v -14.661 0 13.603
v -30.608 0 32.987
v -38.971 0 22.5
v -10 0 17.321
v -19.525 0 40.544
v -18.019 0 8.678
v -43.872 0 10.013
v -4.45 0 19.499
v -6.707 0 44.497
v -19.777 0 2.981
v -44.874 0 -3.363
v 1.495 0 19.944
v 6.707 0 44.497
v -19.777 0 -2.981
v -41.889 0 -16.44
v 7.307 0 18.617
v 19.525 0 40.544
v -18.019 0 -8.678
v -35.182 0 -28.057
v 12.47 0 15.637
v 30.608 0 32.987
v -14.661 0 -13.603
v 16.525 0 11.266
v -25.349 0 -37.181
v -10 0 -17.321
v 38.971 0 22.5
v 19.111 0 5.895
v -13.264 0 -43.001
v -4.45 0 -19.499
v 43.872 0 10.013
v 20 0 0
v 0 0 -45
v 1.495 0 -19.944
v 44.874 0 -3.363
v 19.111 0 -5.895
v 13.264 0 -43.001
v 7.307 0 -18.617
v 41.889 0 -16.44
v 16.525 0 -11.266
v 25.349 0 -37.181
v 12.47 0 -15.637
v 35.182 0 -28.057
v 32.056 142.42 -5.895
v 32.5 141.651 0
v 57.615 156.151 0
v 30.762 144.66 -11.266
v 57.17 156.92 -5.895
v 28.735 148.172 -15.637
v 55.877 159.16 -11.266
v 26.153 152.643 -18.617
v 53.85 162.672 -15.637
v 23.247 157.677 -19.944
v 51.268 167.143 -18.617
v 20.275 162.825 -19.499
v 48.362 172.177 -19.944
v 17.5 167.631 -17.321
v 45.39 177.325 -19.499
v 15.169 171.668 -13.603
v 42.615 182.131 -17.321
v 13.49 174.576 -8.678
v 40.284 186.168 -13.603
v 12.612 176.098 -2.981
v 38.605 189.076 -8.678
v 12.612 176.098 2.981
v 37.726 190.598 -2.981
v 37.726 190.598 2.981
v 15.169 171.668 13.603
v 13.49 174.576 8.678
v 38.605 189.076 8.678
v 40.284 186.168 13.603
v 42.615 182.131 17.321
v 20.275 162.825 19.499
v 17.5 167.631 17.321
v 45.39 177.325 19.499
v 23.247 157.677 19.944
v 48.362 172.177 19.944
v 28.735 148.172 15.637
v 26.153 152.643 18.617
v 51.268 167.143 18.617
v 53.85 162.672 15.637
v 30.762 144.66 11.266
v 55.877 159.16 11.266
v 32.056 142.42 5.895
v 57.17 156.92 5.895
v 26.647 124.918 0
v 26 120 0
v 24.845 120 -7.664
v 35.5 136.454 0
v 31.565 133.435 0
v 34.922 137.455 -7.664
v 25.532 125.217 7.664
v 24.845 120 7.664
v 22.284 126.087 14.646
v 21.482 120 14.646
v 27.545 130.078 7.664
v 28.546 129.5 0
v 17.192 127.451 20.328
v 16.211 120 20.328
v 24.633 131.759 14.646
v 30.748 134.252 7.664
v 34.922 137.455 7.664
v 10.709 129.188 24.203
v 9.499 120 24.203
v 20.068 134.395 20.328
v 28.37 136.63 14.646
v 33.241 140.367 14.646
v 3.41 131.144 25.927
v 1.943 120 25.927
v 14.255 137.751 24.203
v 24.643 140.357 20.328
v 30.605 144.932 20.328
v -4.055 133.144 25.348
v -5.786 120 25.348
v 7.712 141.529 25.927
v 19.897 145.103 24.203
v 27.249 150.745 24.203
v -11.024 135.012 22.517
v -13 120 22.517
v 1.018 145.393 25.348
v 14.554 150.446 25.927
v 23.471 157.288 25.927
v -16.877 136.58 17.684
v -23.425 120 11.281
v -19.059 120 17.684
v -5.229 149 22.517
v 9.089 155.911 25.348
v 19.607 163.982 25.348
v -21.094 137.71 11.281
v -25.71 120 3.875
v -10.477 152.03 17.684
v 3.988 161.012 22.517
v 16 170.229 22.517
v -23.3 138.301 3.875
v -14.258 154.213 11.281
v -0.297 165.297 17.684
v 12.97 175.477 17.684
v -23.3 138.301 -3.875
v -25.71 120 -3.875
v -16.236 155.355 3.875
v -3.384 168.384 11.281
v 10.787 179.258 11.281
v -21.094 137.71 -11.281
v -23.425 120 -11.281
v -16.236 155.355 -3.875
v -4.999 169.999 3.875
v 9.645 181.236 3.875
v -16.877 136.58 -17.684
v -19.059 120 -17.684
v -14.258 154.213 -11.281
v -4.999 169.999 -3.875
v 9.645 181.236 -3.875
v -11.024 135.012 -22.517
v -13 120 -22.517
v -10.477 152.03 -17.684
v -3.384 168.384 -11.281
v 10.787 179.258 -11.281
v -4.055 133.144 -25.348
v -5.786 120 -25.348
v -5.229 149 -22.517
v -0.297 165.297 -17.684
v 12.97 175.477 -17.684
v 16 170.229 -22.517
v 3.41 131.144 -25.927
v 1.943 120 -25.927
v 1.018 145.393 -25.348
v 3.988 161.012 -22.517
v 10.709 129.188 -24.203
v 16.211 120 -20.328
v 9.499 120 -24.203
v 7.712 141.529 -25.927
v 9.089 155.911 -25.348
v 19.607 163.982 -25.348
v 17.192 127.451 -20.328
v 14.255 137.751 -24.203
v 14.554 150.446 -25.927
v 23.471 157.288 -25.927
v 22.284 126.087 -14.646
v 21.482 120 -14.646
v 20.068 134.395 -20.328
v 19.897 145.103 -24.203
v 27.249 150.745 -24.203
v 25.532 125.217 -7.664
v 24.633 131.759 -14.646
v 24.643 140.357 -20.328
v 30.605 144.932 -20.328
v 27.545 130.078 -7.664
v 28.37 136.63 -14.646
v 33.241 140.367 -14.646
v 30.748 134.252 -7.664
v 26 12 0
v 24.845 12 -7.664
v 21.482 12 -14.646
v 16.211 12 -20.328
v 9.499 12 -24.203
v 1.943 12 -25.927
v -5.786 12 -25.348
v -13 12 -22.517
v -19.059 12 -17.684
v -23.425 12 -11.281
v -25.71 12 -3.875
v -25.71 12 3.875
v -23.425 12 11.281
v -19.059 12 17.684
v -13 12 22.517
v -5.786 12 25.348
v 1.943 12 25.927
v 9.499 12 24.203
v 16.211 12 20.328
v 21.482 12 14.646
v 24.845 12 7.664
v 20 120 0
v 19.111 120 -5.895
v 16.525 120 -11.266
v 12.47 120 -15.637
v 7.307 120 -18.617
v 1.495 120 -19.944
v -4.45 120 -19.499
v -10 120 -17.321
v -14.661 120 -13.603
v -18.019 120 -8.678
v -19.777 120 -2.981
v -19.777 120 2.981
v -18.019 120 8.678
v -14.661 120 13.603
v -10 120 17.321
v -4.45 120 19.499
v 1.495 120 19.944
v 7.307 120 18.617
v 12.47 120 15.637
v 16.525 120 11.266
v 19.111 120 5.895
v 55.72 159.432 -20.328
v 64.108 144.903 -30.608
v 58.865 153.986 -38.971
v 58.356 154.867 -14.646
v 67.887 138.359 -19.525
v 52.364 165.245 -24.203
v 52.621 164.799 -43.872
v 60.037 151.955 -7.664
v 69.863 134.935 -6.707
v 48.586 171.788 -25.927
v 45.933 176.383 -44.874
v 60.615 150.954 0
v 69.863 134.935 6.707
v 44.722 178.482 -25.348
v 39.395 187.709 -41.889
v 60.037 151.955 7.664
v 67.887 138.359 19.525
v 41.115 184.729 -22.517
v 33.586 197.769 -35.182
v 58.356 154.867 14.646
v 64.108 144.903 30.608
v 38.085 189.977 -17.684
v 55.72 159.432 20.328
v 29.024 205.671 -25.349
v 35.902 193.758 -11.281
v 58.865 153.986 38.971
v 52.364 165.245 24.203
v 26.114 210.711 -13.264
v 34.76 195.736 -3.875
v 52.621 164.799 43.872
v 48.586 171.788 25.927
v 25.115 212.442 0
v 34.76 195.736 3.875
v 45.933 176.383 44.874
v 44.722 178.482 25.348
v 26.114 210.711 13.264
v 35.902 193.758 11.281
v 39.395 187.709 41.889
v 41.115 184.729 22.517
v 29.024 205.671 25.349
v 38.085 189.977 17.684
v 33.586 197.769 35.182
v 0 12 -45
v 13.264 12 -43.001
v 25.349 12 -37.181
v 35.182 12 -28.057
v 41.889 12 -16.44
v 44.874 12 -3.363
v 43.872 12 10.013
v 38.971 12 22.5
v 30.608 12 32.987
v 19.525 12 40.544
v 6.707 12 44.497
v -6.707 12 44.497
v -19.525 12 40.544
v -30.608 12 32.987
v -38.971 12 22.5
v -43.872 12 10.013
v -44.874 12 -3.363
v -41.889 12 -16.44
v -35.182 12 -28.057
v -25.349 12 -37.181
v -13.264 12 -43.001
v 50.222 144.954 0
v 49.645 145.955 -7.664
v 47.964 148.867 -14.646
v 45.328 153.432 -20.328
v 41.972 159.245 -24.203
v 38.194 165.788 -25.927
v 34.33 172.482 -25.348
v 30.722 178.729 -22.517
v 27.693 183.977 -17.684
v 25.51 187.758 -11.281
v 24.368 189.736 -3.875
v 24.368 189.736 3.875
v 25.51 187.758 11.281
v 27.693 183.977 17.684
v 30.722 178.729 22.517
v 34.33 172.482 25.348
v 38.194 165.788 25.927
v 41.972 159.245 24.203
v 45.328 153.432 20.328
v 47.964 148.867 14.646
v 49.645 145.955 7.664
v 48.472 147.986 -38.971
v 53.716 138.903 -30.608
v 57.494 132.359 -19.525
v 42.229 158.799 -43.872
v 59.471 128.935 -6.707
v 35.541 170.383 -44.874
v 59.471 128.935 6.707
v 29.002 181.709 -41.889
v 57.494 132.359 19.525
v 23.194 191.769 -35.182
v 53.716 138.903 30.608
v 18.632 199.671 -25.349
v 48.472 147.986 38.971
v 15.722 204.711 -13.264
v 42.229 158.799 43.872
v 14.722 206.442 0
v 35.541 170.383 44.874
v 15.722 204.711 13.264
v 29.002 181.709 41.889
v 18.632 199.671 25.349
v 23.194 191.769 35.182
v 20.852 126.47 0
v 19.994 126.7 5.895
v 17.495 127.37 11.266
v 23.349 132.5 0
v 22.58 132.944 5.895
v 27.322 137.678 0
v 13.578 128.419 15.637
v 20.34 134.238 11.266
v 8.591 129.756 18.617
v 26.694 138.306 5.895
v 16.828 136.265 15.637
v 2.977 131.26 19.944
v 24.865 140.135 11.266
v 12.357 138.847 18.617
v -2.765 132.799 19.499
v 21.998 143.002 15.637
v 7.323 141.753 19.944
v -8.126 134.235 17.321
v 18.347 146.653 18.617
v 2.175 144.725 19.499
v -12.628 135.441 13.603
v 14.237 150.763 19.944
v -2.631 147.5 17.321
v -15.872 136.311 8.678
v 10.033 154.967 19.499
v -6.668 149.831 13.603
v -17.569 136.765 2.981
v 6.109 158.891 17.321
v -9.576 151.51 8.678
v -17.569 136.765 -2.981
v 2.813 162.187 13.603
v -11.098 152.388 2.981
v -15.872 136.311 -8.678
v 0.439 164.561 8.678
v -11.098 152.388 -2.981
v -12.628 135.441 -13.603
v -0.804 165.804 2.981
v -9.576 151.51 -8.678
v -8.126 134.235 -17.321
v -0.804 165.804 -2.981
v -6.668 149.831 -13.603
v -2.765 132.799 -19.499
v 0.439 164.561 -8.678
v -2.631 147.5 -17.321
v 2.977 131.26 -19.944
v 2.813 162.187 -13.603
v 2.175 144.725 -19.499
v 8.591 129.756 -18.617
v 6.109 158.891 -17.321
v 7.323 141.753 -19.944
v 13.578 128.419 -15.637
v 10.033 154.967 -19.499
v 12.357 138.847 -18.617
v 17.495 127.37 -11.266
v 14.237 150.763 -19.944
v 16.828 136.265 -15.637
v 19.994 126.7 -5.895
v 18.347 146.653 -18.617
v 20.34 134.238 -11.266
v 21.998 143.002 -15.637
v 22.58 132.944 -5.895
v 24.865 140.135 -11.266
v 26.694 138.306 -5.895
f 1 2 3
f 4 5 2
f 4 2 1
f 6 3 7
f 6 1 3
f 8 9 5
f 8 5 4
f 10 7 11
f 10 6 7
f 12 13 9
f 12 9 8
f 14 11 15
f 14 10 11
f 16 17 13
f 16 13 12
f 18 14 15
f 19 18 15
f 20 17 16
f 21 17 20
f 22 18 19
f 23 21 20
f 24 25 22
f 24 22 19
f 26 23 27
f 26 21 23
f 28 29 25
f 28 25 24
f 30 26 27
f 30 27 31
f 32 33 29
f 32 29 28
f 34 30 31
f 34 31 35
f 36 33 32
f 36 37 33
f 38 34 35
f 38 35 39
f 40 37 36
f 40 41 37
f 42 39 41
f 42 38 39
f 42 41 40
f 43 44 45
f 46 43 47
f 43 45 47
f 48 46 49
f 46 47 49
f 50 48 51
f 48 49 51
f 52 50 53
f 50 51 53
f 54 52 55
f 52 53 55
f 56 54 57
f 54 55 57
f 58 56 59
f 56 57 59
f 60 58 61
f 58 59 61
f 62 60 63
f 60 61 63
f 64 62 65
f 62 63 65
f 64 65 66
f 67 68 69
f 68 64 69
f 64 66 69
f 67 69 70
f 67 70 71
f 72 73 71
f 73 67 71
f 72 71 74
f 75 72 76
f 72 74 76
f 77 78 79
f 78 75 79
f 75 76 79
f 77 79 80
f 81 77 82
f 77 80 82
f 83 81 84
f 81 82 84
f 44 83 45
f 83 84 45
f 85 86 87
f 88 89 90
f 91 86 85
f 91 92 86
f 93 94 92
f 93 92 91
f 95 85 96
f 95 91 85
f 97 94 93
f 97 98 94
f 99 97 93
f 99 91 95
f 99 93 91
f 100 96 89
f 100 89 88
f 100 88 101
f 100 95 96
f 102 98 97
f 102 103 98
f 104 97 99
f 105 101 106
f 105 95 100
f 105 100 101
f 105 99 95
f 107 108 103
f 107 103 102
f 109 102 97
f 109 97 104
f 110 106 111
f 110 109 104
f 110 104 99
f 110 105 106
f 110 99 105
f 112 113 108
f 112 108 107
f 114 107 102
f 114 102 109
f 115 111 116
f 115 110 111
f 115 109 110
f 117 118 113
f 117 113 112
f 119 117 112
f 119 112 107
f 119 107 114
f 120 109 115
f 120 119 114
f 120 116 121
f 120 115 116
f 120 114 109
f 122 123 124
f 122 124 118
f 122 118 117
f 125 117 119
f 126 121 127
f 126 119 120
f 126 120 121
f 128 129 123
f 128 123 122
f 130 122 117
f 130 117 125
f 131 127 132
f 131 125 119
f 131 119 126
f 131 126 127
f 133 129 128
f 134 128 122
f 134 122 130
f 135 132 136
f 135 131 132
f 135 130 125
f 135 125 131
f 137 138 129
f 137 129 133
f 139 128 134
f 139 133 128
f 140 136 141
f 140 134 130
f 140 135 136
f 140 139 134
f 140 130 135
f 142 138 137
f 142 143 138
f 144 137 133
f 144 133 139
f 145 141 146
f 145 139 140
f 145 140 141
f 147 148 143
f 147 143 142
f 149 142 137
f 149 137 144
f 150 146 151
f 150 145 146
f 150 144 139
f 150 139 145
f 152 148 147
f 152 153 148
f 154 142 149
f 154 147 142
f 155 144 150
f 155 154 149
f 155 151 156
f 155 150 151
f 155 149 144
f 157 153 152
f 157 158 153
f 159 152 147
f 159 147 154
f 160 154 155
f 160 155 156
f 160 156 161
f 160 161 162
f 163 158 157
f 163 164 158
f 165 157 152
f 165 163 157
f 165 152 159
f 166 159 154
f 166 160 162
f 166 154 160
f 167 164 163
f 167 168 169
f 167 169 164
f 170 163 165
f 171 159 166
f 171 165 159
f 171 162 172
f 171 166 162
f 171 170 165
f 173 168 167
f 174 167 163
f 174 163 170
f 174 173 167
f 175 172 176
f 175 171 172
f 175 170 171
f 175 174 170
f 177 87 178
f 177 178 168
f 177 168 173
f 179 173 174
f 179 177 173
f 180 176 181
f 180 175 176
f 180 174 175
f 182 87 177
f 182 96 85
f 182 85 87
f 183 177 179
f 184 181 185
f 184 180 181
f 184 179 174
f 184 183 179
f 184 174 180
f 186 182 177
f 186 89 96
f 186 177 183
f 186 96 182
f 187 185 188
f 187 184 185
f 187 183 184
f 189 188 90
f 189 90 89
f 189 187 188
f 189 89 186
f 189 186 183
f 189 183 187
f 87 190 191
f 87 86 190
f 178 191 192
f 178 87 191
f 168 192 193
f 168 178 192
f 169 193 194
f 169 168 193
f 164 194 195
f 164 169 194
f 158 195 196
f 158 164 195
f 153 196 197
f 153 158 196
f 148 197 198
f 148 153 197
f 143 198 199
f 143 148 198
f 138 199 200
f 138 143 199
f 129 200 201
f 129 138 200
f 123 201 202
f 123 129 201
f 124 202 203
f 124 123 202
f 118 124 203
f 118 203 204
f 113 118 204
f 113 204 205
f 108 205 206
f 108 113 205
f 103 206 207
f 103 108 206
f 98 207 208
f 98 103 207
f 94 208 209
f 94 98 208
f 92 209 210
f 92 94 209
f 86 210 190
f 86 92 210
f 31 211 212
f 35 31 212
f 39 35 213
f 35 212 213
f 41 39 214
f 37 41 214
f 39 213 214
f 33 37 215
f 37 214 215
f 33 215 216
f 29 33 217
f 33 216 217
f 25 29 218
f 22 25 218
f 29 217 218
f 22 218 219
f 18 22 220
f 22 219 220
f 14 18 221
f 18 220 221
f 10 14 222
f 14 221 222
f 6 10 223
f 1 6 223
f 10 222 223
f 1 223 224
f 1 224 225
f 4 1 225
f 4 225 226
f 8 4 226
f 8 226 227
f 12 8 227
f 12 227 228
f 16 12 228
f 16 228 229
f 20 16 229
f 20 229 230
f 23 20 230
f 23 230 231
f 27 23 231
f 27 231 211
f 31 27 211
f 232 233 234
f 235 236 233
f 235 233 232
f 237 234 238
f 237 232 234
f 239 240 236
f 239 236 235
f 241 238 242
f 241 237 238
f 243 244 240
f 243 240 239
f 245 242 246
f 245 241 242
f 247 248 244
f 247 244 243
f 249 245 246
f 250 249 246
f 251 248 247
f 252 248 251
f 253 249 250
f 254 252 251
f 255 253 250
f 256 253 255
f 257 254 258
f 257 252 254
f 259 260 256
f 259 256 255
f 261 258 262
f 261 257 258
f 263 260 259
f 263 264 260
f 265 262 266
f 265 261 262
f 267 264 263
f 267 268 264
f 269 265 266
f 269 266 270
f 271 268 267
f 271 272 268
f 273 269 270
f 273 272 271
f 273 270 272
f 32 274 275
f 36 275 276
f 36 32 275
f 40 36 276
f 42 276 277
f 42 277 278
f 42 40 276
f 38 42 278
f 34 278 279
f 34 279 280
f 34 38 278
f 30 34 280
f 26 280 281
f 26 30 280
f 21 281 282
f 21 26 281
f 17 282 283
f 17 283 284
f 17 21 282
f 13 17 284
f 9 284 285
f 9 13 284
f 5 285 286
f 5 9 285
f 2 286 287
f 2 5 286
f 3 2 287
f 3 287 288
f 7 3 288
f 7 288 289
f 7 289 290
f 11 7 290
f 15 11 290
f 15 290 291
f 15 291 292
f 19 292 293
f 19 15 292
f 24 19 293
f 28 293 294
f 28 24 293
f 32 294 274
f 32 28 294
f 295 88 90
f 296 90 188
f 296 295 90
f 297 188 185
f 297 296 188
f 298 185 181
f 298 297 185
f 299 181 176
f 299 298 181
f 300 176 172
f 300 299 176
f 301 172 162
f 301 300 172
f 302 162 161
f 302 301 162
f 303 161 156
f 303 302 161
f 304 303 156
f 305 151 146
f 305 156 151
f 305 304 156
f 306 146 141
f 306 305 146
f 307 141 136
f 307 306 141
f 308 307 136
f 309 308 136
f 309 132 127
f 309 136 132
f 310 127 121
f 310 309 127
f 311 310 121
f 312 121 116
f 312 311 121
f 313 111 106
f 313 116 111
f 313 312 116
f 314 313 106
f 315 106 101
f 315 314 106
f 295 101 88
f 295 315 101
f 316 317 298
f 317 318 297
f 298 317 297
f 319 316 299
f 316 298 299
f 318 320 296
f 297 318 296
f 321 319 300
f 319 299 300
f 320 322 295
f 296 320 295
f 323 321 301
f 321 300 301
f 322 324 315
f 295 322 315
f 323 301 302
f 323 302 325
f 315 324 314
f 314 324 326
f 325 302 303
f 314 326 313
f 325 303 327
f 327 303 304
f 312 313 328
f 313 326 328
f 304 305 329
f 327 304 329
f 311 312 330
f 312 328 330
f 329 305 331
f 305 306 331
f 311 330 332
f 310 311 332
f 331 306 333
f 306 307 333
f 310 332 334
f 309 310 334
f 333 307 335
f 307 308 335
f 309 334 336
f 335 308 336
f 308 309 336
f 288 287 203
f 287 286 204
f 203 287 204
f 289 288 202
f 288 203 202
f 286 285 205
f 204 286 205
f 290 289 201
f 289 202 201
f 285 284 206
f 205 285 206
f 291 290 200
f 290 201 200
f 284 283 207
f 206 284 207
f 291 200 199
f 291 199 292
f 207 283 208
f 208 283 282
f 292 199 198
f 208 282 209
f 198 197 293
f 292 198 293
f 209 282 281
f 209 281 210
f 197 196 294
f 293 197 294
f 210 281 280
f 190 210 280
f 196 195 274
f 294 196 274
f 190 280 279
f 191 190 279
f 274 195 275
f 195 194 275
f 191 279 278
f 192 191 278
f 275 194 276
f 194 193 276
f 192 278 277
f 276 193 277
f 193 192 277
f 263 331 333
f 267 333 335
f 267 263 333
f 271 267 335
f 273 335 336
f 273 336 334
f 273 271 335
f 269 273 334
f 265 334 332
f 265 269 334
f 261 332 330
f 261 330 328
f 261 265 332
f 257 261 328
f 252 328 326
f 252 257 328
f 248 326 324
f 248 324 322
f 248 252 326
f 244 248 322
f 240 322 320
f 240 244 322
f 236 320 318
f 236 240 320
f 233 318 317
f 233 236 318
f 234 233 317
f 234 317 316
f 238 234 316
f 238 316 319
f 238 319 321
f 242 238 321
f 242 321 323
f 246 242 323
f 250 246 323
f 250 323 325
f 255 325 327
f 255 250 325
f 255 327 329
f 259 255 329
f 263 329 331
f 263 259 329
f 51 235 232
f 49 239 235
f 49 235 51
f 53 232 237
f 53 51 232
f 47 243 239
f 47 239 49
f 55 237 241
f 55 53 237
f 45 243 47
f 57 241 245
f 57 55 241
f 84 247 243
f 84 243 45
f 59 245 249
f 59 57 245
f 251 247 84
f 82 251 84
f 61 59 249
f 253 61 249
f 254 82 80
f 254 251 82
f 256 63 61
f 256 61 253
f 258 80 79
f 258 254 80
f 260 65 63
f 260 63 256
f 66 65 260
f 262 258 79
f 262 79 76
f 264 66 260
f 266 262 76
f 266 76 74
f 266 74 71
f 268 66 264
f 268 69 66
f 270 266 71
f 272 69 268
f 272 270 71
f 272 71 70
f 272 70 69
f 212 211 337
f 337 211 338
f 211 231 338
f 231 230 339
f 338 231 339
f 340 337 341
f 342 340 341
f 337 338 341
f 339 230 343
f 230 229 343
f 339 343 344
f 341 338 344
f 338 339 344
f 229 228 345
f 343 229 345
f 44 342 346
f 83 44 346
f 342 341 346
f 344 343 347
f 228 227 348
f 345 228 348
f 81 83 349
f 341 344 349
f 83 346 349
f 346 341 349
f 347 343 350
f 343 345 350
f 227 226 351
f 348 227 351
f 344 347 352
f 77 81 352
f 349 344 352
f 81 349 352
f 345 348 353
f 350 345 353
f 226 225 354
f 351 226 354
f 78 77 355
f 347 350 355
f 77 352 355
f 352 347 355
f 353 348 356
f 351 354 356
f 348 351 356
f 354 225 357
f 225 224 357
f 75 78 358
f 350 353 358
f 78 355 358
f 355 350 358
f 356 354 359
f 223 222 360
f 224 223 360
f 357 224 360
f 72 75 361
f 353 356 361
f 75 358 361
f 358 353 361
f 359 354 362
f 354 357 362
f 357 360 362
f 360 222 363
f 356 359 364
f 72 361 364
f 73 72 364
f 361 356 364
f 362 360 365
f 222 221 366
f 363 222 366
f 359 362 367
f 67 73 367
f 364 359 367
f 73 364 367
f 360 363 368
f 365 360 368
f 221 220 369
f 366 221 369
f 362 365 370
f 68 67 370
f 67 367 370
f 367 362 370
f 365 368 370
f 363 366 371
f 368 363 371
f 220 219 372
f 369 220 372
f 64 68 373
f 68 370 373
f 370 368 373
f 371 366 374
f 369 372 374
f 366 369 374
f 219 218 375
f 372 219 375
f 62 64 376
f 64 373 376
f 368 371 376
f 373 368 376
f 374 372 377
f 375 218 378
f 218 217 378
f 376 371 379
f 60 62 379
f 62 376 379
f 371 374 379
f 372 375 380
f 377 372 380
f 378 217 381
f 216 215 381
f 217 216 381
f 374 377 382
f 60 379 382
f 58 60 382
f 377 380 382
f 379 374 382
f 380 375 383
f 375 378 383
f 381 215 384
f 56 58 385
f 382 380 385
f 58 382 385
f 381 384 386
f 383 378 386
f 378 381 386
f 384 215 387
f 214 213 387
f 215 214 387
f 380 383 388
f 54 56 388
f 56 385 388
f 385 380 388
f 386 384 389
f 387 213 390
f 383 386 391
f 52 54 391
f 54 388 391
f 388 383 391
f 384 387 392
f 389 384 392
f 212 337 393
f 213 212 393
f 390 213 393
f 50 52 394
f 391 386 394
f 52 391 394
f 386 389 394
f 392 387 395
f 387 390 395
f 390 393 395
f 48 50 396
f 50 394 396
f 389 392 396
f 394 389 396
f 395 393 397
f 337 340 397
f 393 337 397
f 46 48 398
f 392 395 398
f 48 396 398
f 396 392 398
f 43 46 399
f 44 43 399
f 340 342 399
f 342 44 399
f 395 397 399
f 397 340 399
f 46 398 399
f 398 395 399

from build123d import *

# Parameters (mm, degrees)
SKIZZE2_R                       = 26
SKIZZE2_R_2                     = 20
SKIZZE3_R                       = 45
SKIZZE3_R_2                     = 26
AUFSATZ_LINEAR_AUSTRAGEN1_DEPTH = 12
SKIZZE4_R                       = 45
SKIZZE4_R_2                     = 20
AUFSATZ_LINEAR_AUSTRAGEN2_DEPTH = 12


with BuildPart() as part:
    # Austragung-Dünn1: sweep along a path in Skizze1
    with BuildLine(Plane.XY) as austragung_d_nn1_path:
        Line((0, 0), (0, 120))
        ThreePointArc((0, 120), (6.02885683, 142.5), (22.5, 158.97114317))
        Line((22.5, 158.97114317), (47.61473671, 173.47114317))
    # Skizze2 → Austragung-Dünn1 (sweep)
    with BuildSketch(Plane(origin=(0, 0, 0), x_dir=(1, 0, 0), z_dir=(0, 1, 0))):
        Circle(SKIZZE2_R)
        Circle(SKIZZE2_R_2, mode=Mode.SUBTRACT)
    sweep(path=austragung_d_nn1_path.line)

    # Skizze3 → Aufsatz-Linear austragen1 (add)
    with BuildSketch(Plane.XZ):
        with Locations(Location((0, 0, 0), (0, 0, 270))):  # turned: the seam where the file's is
            Circle(SKIZZE3_R)
        with Locations(Location((0, 0, 0), (0, 0, 270))):  # turned: the seam where the file's is
            Circle(SKIZZE3_R_2, mode=Mode.SUBTRACT)
    extrude(amount=-AUFSATZ_LINEAR_AUSTRAGEN1_DEPTH)

    # Skizze4 → Aufsatz-Linear austragen2 (add)
    with BuildSketch(Plane(origin=(110.826260937, 63.985571585, 0), x_dir=(0, 0, -1), z_dir=(0.866025404, 0.5, 0))):
        with Locations(Location((0, 126.423048454, 0), (0, 0, 90))):  # turned: the seam where the file's is
            Circle(SKIZZE4_R)
        with Locations(Location((0, 126.423048454, 0), (0, 0, 90))):  # turned: the seam where the file's is
            Circle(SKIZZE4_R_2, mode=Mode.SUBTRACT)
    extrude(amount=-AUFSATZ_LINEAR_AUSTRAGEN2_DEPTH)


solid = part.part
